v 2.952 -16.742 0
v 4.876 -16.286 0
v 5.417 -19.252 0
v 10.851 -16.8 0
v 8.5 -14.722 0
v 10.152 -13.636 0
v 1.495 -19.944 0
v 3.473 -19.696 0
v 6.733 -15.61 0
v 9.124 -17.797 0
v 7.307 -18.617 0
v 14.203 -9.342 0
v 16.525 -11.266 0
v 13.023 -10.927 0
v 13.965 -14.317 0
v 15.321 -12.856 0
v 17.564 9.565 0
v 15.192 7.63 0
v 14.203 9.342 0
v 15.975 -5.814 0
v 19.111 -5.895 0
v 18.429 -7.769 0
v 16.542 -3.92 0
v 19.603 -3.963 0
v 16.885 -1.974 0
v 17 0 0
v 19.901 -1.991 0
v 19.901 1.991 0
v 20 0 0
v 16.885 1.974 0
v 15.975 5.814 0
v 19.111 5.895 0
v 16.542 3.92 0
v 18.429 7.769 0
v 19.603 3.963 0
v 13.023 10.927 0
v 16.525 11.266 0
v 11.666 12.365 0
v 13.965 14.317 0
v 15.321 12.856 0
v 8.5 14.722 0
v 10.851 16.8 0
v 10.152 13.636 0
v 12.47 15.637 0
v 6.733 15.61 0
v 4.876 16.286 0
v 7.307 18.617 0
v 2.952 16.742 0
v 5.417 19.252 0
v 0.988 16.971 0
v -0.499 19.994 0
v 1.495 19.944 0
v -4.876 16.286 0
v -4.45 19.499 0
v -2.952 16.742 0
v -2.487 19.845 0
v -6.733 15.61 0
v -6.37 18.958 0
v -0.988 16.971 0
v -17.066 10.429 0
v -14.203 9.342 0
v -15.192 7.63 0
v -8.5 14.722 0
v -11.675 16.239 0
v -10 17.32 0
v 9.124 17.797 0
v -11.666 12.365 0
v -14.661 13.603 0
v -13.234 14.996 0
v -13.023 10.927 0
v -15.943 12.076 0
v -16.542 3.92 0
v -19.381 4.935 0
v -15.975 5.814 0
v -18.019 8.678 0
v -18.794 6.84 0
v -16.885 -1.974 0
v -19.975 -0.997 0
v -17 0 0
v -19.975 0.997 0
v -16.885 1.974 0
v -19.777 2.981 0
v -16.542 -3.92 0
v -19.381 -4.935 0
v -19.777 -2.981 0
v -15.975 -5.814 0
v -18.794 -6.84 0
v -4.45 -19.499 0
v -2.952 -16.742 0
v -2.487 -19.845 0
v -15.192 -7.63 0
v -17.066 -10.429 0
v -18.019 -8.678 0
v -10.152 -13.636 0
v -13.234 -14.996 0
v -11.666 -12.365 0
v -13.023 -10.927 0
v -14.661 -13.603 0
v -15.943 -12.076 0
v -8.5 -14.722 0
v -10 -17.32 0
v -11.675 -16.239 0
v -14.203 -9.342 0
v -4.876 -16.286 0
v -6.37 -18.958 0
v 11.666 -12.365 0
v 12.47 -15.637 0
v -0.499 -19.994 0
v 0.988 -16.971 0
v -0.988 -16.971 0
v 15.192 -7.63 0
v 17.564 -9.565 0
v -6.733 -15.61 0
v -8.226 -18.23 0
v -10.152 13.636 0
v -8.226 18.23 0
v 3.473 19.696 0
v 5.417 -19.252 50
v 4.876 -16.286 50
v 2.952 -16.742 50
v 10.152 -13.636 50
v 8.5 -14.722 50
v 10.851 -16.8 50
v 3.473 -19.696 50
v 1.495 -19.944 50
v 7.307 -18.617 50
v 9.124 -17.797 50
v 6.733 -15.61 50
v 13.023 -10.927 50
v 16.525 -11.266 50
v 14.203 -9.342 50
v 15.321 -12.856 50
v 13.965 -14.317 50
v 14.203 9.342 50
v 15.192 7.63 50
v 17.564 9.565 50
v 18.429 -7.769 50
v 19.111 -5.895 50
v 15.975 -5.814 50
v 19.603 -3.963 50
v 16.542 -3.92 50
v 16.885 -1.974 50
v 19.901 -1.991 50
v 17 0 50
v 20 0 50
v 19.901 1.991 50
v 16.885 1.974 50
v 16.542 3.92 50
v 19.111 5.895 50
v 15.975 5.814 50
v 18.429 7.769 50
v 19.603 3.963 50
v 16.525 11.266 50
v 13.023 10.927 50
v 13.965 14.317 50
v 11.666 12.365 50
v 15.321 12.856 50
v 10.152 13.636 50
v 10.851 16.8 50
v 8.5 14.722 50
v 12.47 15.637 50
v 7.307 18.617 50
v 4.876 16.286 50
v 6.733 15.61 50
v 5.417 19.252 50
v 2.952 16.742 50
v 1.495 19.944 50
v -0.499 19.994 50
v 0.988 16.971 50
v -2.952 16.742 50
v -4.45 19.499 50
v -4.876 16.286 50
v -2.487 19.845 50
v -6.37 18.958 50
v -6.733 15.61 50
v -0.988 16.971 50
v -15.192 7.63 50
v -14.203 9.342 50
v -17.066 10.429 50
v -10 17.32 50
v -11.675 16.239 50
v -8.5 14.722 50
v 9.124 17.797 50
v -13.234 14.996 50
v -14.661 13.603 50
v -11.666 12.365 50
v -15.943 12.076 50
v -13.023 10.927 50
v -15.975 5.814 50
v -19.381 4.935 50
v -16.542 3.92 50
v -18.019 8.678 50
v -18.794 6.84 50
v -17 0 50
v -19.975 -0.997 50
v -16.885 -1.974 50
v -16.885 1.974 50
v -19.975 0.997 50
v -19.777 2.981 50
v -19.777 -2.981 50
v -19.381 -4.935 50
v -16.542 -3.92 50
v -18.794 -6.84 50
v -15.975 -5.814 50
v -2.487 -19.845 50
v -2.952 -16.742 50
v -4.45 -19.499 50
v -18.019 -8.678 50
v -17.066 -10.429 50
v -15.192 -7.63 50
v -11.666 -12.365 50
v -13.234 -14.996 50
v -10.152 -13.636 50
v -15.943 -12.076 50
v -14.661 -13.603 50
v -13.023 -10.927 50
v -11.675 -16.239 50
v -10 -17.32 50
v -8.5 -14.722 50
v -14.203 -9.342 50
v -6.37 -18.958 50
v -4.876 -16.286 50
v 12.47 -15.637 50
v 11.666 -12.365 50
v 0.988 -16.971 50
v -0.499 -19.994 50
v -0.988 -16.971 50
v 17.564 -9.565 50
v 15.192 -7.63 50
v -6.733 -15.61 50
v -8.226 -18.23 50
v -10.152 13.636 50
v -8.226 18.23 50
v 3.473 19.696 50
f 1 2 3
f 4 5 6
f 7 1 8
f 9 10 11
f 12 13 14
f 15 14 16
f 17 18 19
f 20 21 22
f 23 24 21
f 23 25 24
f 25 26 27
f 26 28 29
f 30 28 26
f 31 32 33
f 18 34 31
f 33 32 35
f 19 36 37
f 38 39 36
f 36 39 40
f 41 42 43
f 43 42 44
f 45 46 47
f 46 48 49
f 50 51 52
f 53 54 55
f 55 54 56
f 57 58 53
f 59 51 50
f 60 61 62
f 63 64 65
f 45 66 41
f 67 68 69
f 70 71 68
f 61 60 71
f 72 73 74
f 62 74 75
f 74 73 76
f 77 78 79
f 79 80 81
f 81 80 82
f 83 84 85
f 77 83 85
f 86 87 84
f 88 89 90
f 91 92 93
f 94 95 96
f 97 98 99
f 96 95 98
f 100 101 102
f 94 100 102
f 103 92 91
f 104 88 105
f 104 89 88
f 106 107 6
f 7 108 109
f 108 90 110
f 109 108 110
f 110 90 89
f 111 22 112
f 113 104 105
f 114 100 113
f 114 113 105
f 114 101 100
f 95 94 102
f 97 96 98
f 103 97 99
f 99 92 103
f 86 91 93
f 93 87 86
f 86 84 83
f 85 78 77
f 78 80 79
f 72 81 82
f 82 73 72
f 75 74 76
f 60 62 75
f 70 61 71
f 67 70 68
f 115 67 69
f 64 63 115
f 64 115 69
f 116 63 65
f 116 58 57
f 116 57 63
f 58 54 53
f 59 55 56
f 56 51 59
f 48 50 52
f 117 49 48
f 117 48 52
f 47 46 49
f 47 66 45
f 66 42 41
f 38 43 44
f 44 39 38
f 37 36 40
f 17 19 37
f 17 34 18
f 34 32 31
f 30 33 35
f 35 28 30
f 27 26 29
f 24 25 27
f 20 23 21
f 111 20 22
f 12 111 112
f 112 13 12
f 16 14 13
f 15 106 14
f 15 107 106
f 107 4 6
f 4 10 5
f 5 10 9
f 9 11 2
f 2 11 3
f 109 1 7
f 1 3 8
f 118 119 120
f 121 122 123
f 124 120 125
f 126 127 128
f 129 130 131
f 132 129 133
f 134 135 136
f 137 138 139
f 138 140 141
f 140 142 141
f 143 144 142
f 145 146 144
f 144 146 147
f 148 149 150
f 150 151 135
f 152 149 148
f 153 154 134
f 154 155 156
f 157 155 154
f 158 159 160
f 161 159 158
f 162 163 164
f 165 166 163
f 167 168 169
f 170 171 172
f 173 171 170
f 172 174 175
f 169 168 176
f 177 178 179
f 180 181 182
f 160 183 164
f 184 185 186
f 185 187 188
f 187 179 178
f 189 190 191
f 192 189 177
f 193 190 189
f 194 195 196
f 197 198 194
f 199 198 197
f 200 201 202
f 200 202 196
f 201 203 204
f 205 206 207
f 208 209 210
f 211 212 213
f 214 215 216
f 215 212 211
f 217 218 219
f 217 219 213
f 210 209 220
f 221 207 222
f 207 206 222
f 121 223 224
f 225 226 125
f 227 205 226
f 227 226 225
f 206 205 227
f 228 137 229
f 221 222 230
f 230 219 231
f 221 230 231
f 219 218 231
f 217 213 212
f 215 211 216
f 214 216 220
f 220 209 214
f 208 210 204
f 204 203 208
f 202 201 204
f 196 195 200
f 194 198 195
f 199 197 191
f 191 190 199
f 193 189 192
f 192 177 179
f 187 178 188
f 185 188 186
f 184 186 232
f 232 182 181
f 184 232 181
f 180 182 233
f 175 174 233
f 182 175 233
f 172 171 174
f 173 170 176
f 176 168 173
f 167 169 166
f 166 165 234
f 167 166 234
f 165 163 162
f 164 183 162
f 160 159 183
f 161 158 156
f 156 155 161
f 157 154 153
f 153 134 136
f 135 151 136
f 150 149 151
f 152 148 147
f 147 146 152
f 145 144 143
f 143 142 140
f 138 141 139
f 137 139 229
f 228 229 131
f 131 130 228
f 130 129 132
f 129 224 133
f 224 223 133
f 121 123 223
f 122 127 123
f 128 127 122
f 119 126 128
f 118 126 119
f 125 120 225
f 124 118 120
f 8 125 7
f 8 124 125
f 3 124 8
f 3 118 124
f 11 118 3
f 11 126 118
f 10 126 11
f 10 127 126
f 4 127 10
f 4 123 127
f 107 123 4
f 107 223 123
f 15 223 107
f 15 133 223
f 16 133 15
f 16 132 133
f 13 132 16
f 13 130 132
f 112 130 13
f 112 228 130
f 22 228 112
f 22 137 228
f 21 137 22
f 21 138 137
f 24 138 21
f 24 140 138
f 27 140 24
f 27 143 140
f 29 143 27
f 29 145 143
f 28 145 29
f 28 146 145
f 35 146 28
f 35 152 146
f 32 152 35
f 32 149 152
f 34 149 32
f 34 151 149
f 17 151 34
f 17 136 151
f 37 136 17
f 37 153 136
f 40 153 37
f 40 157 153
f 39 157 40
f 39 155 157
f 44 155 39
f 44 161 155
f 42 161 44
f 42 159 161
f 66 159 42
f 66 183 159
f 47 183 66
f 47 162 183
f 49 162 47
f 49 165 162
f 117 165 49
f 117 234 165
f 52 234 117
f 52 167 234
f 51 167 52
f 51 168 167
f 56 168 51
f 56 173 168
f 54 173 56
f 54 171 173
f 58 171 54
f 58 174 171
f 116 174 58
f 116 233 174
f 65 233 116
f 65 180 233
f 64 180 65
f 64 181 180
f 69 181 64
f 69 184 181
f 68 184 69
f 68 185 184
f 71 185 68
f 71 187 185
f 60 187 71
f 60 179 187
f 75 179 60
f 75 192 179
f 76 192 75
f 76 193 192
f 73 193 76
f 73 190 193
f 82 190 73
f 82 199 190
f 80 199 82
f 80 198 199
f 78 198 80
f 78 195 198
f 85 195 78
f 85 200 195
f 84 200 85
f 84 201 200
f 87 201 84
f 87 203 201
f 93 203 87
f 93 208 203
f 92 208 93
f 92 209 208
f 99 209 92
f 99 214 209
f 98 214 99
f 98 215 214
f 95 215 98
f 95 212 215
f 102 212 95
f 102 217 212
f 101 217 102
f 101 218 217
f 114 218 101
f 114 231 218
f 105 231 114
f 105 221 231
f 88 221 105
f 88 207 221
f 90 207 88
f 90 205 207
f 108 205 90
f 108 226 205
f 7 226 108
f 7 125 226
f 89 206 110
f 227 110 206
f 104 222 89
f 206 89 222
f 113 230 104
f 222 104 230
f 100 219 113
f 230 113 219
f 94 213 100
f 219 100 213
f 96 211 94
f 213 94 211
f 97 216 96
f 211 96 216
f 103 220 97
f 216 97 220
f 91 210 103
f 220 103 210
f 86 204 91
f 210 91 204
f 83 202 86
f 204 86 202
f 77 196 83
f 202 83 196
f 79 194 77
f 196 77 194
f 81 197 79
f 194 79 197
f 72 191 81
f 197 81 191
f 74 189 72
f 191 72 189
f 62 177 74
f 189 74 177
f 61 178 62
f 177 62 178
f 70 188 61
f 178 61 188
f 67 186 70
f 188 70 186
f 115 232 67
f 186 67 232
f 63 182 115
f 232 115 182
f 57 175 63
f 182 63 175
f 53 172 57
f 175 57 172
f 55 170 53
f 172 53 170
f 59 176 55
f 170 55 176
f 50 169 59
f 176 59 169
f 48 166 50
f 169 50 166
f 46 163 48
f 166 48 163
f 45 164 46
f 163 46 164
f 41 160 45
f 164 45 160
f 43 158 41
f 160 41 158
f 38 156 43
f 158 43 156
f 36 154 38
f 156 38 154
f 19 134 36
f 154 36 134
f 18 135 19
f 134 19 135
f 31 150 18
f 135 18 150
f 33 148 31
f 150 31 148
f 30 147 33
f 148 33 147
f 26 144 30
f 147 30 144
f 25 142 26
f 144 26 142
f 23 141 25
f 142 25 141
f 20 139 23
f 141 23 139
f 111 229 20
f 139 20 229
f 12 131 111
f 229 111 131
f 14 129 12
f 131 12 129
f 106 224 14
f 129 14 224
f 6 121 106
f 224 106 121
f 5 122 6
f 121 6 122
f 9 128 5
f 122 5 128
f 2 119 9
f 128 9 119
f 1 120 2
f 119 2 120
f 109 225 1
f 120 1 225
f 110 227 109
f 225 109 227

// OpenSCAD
// Generated by Parametrix
ca_myPartA_faceSection_000 = [ [ 20.0000, 0.0000 ],[ 19.9006, 1.9914 ],[ 19.6034, 3.9629 ],[ 19.1115, 5.8951 ],[ 18.4295, 7.7687 ],[ 17.5644, 9.5651 ],[ 16.5248, 11.2664 ],[ 15.3209, 12.8558 ],[ 13.9647, 14.3173 ],[ 12.4698, 15.6366 ],[ 10.8509, 16.8005 ],[ 9.1242, 17.7974 ],[ 7.3068, 18.6175 ],[ 5.4168, 19.2525 ],[ 3.4730, 19.6962 ],[ 1.4946, 19.9441 ],[ -0.4986, 19.9938 ],[ -2.4869, 19.8448 ],[ -4.4504, 19.4986 ],[ -6.3697, 18.9585 ],[ -8.2257, 18.2301 ],[ -10.0000, 17.3205 ],[ -11.6749, 16.2388 ],[ -13.2337, 14.9956 ],[ -14.6610, 13.6035 ],[ -15.9427, 12.0761 ],[ -17.0658, 10.4287 ],[ -18.0194, 8.6777 ],[ -18.7939, 6.8404 ],[ -19.3815, 4.9351 ],[ -19.7766, 2.9808 ],[ -19.9751, 0.9969 ],[ -19.9751, -0.9969 ],[ -19.7766, -2.9808 ],[ -19.3815, -4.9351 ],[ -18.7939, -6.8404 ],[ -18.0194, -8.6777 ],[ -17.0658, -10.4287 ],[ -15.9427, -12.0761 ],[ -14.6610, -13.6035 ],[ -13.2337, -14.9956 ],[ -11.6749, -16.2388 ],[ -10.0000, -17.3205 ],[ -8.2257, -18.2301 ],[ -6.3697, -18.9585 ],[ -4.4504, -19.4986 ],[ -2.4869, -19.8448 ],[ -0.4986, -19.9938 ],[ 1.4946, -19.9441 ],[ 3.4730, -19.6962 ],[ 5.4168, -19.2525 ],[ 7.3068, -18.6175 ],[ 9.1242, -17.7974 ],[ 10.8509, -16.8005 ],[ 12.4698, -15.6366 ],[ 13.9647, -14.3173 ],[ 15.3209, -12.8558 ],[ 16.5248, -11.2664 ],[ 17.5644, -9.5651 ],[ 18.4295, -7.7687 ],[ 19.1115, -5.8951 ],[ 19.6034, -3.9629 ],[ 19.9006, -1.9914 ],[ 20.0000, 0.0000 ] ];
cb_myPartA_faceSection_000 = [  0, 1, 2, 3, 4, 5, 6, 7, 8, 9, 10, 11, 12, 13, 14, 15, 16, 17, 18, 19, 20, 21, 22, 23, 24, 25, 26, 27, 28, 29, 30, 31, 32, 33, 34, 35, 36, 37, 38, 39, 40, 41, 42, 43, 44, 45, 46, 47, 48, 49, 50, 51, 52, 53, 54, 55, 56, 57, 58, 59, 60, 61, 62, 63 ];
ca_myPartA_faceSection_001 = [ [ 17.0000, 0.0000 ],[ 16.8851, 1.9736 ],[ 16.5418, 3.9205 ],[ 15.9748, 5.8143 ],[ 15.1918, 7.6296 ],[ 14.2033, 9.3417 ],[ 13.0228, 10.9274 ],[ 11.6661, 12.3654 ],[ 10.1517, 13.6361 ],[ 8.5000, 14.7224 ],[ 6.7334, 15.6097 ],[ 4.8757, 16.2858 ],[ 2.9520, 16.7417 ],[ 0.9885, 16.9712 ],[ -0.9885, 16.9712 ],[ -2.9520, 16.7417 ],[ -4.8757, 16.2858 ],[ -6.7334, 15.6097 ],[ -8.5000, 14.7224 ],[ -10.1517, 13.6361 ],[ -11.6661, 12.3654 ],[ -13.0228, 10.9274 ],[ -14.2033, 9.3417 ],[ -15.1918, 7.6296 ],[ -15.9748, 5.8143 ],[ -16.5418, 3.9205 ],[ -16.8851, 1.9736 ],[ -17.0000, 0.0000 ],[ -16.8851, -1.9736 ],[ -16.5418, -3.9205 ],[ -15.9748, -5.8143 ],[ -15.1918, -7.6296 ],[ -14.2033, -9.3417 ],[ -13.0228, -10.9274 ],[ -11.6661, -12.3654 ],[ -10.1517, -13.6361 ],[ -8.5000, -14.7224 ],[ -6.7334, -15.6097 ],[ -4.8757, -16.2858 ],[ -2.9520, -16.7417 ],[ -0.9885, -16.9712 ],[ 0.9885, -16.9712 ],[ 2.9520, -16.7417 ],[ 4.8757, -16.2858 ],[ 6.7334, -15.6097 ],[ 8.5000, -14.7224 ],[ 10.1517, -13.6361 ],[ 11.6661, -12.3654 ],[ 13.0228, -10.9274 ],[ 14.2033, -9.3417 ],[ 15.1918, -7.6296 ],[ 15.9748, -5.8143 ],[ 16.5418, -3.9205 ],[ 16.8851, -1.9736 ],[ 17.0000, 0.0000 ] ];
cb_myPartA_faceSection_001 = [  64, 65, 66, 67, 68, 69, 70, 71, 72, 73, 74, 75, 76, 77, 78, 79, 80, 81, 82, 83, 84, 85, 86, 87, 88, 89, 90, 91, 92, 93, 94, 95, 96, 97, 98, 99, 100, 101, 102, 103, 104, 105, 106, 107, 108, 109, 110, 111, 112, 113, 114, 115, 116, 117, 118 ];
a_myPartA_faceSection = concat(ca_myPartA_faceSection_000, ca_myPartA_faceSection_001);
b_myPartA_faceSection = [cb_myPartA_faceSection_000, cb_myPartA_faceSection_001];
ca_myPartA_faceSide_000 = [ [ 20.0000, 0.0000 ],[ 20.0000, 50.0000 ],[ 17.0000, 50.0000 ],[ 17.0000, 0.0000 ],[ 20.0000, 0.0000 ] ];
cb_myPartA_faceSide_000 = [  0, 1, 2, 3, 4 ];
a_myPartA_faceSide = concat(ca_myPartA_faceSide_000);
b_myPartA_faceSide = [cb_myPartA_faceSide_000];

module subpax_myPartA () {
	translate( [ 0, 0, 0 ])
		rotate( [ 0, 0, 0 ])
			   linear_extrude(height = 50) polygon(a_myPartA_faceSection, b_myPartA_faceSection);
}

module pax_myPartA () {
	subpax_myPartA();
}

pax_myPartA();
